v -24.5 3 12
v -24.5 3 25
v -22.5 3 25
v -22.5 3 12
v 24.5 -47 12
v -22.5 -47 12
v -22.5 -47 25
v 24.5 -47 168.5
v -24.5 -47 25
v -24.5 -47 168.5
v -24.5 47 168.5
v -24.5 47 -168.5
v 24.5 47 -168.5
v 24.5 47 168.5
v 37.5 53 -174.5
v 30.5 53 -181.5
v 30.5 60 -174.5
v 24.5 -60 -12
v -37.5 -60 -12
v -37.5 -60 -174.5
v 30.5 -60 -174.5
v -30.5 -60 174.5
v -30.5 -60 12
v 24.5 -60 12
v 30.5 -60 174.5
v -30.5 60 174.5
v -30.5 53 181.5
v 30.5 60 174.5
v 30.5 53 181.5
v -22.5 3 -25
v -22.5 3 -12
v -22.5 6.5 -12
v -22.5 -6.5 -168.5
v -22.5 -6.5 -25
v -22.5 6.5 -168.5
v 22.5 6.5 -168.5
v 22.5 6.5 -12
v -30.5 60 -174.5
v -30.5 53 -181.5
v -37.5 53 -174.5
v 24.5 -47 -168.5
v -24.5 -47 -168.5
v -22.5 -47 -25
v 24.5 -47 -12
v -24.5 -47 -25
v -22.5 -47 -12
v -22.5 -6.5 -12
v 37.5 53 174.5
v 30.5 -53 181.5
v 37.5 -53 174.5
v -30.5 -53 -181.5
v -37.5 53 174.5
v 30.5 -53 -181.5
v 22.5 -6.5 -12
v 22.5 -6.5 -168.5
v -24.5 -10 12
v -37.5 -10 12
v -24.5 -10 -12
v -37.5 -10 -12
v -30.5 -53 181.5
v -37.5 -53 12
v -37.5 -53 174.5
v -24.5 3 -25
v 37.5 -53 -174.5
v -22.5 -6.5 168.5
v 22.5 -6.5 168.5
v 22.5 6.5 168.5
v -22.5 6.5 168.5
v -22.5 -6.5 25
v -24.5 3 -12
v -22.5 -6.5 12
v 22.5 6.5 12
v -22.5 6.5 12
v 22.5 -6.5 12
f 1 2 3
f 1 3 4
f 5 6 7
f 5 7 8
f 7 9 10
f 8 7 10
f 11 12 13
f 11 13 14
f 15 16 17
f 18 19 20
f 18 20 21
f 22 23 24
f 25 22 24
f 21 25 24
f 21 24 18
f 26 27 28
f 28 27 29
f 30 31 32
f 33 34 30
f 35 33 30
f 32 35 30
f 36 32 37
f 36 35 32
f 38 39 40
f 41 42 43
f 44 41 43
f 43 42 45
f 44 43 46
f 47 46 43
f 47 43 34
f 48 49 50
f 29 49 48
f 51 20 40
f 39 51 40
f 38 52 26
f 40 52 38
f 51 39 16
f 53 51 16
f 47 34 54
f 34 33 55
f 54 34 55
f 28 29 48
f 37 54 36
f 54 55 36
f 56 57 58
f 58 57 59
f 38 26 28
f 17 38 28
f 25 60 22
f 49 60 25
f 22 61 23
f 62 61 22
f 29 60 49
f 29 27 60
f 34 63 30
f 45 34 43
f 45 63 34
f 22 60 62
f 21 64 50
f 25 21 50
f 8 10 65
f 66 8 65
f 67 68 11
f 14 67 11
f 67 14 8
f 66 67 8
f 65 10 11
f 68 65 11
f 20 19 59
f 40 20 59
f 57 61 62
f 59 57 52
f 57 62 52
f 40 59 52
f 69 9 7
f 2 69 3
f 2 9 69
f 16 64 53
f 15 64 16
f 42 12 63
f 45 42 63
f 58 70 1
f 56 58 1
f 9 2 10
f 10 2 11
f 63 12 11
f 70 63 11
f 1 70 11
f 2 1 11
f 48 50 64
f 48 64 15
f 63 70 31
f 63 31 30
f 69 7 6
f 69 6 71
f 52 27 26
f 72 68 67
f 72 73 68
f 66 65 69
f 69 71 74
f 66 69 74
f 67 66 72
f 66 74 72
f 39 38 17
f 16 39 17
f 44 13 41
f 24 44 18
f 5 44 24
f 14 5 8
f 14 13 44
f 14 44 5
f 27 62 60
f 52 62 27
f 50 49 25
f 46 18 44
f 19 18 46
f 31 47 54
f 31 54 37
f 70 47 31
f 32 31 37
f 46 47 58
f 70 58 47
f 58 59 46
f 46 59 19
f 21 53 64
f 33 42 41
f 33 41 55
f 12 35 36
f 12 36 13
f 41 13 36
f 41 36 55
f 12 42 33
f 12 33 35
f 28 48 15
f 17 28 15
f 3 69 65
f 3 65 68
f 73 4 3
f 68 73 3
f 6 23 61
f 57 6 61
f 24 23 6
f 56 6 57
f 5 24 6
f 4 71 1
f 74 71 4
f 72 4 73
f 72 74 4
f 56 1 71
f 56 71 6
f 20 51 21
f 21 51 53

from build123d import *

# Parameters (mm, degrees)
SKETCH1_W                       = 75
SKETCH1_H                       = 120
BOSS_EXTRUDE1_DEPTH             = 181.5
SKETCH2_W                       = 24
SKETCH2_H                       = 50
CUT_EXTRUDE1_DEPTH              = 15
SHELL1_START                    = -22.5
SHELL1_OUTLINE_W                = 94
SHELL1_OUTLINE_H                = 337
SHELL1_DEPTH                    = 47
SHELL1_START_2                  = -24.5
SHELL1_2_DEPTH                  = 2
BOSS_EXTRUDE2_REACH             = 196.804
SKETCH3_W                       = 45
SKETCH3_H                       = 13
BOSS_EXTRUDE2_DIRECTION_2_REACH = 196.804
CHAMFER1_SIZE                   = 7
CUT_EXTRUDE2_START              = -62
SKETCH4_W                       = 24
SKETCH4_H                       = 104.028076608
CUT_EXTRUDE2_DEPTH              = 49


# Read off the part's stored shape, not the designer's step: Shell1
with BuildPart() as part:
    # Sketch1 → Boss-Extrude1 (new, symmetric)
    with BuildSketch(Plane.XY):
        Rectangle(SKETCH1_W, SKETCH1_H)
    extrude(amount=BOSS_EXTRUDE1_DEPTH, both=True)

    # Sketch2 → Cut-Extrude1 (cut)
    with BuildSketch(Plane(origin=(-37.5, 0, 131.5), x_dir=(0, 0, -1), z_dir=(1, 0, 0))):
        with Locations((131.5, -35)):
            Rectangle(SKETCH2_W, SKETCH2_H)
    extrude(amount=CUT_EXTRUDE1_DEPTH, mode=Mode.SUBTRACT)

    # Shell1 outline → Shell1 (cut)
    with BuildSketch(Plane.YZ.offset(SHELL1_START)):
        Rectangle(SHELL1_OUTLINE_W, SHELL1_OUTLINE_H)
    extrude(amount=SHELL1_DEPTH, mode=Mode.SUBTRACT)

    # Shell1 2 outline → Shell1 2 (cut)
    with BuildSketch(Plane.YZ.offset(SHELL1_START_2)):
        Polygon((-47, -25), (-47, -168.5), (47, -168.5), (47, 168.5), (-47, 168.5), (-47, 25), (3, 25), (3, -25), align=None)
    extrude(amount=SHELL1_2_DEPTH, mode=Mode.SUBTRACT)

    # Sketch3 → Boss-Extrude2 (add, up to next)
    with BuildSketch(Plane.XY, mode=Mode.PRIVATE) as boss_extrude2_sk1:
        Rectangle(SKETCH3_W, SKETCH3_H)
    boss_extrude2_tool1 = extrude(boss_extrude2_sk1.sketch, amount=-BOSS_EXTRUDE2_REACH, mode=Mode.PRIVATE) - part.part
    add(boss_extrude2_tool1.solids().sort_by_distance((0, 0, 0))[0])

    # Sketch3 → Boss-Extrude2 direction 2 (add, up to next)
    with BuildSketch(Plane.XY, mode=Mode.PRIVATE) as boss_extrude2_direction_2_sk1:
        Rectangle(SKETCH3_W, SKETCH3_H)
    boss_extrude2_direction_2_tool1 = extrude(boss_extrude2_direction_2_sk1.sketch, amount=BOSS_EXTRUDE2_DIRECTION_2_REACH, mode=Mode.PRIVATE) - part.part
    add(boss_extrude2_direction_2_tool1.solids().sort_by_distance((0, 0, 0))[0])

    # Chamfer1
    chamfer1_edges = [part.edges().sort_by_distance(p)[0] for p in [
        (0, -60, 181.5),
        (37.5, 0, 181.5),
        (0, 60, 181.5),
        (37.5, 0, -181.5),
        (0, -60, -181.5),
        (-37.5, 0, -181.5),
        (0, 60, -181.5),
        (-37.5, 0, 181.5),
        (37.5, 60, 0),
        (37.5, -60, 0),
        (-37.5, -60, 96.75),
        (-37.5, 60, 0),
    ]]
    chamfer(chamfer1_edges, length=CHAMFER1_SIZE)

    # Sketch4 → Cut-Extrude2 (cut)
    with BuildSketch(Plane.ZY.offset(37.5).offset(CUT_EXTRUDE2_START)):
        with Locations((0, -20.489530189)):
            Rectangle(SKETCH4_W, SKETCH4_H)
    extrude(amount=CUT_EXTRUDE2_DEPTH, mode=Mode.SUBTRACT)


solid = part.part
